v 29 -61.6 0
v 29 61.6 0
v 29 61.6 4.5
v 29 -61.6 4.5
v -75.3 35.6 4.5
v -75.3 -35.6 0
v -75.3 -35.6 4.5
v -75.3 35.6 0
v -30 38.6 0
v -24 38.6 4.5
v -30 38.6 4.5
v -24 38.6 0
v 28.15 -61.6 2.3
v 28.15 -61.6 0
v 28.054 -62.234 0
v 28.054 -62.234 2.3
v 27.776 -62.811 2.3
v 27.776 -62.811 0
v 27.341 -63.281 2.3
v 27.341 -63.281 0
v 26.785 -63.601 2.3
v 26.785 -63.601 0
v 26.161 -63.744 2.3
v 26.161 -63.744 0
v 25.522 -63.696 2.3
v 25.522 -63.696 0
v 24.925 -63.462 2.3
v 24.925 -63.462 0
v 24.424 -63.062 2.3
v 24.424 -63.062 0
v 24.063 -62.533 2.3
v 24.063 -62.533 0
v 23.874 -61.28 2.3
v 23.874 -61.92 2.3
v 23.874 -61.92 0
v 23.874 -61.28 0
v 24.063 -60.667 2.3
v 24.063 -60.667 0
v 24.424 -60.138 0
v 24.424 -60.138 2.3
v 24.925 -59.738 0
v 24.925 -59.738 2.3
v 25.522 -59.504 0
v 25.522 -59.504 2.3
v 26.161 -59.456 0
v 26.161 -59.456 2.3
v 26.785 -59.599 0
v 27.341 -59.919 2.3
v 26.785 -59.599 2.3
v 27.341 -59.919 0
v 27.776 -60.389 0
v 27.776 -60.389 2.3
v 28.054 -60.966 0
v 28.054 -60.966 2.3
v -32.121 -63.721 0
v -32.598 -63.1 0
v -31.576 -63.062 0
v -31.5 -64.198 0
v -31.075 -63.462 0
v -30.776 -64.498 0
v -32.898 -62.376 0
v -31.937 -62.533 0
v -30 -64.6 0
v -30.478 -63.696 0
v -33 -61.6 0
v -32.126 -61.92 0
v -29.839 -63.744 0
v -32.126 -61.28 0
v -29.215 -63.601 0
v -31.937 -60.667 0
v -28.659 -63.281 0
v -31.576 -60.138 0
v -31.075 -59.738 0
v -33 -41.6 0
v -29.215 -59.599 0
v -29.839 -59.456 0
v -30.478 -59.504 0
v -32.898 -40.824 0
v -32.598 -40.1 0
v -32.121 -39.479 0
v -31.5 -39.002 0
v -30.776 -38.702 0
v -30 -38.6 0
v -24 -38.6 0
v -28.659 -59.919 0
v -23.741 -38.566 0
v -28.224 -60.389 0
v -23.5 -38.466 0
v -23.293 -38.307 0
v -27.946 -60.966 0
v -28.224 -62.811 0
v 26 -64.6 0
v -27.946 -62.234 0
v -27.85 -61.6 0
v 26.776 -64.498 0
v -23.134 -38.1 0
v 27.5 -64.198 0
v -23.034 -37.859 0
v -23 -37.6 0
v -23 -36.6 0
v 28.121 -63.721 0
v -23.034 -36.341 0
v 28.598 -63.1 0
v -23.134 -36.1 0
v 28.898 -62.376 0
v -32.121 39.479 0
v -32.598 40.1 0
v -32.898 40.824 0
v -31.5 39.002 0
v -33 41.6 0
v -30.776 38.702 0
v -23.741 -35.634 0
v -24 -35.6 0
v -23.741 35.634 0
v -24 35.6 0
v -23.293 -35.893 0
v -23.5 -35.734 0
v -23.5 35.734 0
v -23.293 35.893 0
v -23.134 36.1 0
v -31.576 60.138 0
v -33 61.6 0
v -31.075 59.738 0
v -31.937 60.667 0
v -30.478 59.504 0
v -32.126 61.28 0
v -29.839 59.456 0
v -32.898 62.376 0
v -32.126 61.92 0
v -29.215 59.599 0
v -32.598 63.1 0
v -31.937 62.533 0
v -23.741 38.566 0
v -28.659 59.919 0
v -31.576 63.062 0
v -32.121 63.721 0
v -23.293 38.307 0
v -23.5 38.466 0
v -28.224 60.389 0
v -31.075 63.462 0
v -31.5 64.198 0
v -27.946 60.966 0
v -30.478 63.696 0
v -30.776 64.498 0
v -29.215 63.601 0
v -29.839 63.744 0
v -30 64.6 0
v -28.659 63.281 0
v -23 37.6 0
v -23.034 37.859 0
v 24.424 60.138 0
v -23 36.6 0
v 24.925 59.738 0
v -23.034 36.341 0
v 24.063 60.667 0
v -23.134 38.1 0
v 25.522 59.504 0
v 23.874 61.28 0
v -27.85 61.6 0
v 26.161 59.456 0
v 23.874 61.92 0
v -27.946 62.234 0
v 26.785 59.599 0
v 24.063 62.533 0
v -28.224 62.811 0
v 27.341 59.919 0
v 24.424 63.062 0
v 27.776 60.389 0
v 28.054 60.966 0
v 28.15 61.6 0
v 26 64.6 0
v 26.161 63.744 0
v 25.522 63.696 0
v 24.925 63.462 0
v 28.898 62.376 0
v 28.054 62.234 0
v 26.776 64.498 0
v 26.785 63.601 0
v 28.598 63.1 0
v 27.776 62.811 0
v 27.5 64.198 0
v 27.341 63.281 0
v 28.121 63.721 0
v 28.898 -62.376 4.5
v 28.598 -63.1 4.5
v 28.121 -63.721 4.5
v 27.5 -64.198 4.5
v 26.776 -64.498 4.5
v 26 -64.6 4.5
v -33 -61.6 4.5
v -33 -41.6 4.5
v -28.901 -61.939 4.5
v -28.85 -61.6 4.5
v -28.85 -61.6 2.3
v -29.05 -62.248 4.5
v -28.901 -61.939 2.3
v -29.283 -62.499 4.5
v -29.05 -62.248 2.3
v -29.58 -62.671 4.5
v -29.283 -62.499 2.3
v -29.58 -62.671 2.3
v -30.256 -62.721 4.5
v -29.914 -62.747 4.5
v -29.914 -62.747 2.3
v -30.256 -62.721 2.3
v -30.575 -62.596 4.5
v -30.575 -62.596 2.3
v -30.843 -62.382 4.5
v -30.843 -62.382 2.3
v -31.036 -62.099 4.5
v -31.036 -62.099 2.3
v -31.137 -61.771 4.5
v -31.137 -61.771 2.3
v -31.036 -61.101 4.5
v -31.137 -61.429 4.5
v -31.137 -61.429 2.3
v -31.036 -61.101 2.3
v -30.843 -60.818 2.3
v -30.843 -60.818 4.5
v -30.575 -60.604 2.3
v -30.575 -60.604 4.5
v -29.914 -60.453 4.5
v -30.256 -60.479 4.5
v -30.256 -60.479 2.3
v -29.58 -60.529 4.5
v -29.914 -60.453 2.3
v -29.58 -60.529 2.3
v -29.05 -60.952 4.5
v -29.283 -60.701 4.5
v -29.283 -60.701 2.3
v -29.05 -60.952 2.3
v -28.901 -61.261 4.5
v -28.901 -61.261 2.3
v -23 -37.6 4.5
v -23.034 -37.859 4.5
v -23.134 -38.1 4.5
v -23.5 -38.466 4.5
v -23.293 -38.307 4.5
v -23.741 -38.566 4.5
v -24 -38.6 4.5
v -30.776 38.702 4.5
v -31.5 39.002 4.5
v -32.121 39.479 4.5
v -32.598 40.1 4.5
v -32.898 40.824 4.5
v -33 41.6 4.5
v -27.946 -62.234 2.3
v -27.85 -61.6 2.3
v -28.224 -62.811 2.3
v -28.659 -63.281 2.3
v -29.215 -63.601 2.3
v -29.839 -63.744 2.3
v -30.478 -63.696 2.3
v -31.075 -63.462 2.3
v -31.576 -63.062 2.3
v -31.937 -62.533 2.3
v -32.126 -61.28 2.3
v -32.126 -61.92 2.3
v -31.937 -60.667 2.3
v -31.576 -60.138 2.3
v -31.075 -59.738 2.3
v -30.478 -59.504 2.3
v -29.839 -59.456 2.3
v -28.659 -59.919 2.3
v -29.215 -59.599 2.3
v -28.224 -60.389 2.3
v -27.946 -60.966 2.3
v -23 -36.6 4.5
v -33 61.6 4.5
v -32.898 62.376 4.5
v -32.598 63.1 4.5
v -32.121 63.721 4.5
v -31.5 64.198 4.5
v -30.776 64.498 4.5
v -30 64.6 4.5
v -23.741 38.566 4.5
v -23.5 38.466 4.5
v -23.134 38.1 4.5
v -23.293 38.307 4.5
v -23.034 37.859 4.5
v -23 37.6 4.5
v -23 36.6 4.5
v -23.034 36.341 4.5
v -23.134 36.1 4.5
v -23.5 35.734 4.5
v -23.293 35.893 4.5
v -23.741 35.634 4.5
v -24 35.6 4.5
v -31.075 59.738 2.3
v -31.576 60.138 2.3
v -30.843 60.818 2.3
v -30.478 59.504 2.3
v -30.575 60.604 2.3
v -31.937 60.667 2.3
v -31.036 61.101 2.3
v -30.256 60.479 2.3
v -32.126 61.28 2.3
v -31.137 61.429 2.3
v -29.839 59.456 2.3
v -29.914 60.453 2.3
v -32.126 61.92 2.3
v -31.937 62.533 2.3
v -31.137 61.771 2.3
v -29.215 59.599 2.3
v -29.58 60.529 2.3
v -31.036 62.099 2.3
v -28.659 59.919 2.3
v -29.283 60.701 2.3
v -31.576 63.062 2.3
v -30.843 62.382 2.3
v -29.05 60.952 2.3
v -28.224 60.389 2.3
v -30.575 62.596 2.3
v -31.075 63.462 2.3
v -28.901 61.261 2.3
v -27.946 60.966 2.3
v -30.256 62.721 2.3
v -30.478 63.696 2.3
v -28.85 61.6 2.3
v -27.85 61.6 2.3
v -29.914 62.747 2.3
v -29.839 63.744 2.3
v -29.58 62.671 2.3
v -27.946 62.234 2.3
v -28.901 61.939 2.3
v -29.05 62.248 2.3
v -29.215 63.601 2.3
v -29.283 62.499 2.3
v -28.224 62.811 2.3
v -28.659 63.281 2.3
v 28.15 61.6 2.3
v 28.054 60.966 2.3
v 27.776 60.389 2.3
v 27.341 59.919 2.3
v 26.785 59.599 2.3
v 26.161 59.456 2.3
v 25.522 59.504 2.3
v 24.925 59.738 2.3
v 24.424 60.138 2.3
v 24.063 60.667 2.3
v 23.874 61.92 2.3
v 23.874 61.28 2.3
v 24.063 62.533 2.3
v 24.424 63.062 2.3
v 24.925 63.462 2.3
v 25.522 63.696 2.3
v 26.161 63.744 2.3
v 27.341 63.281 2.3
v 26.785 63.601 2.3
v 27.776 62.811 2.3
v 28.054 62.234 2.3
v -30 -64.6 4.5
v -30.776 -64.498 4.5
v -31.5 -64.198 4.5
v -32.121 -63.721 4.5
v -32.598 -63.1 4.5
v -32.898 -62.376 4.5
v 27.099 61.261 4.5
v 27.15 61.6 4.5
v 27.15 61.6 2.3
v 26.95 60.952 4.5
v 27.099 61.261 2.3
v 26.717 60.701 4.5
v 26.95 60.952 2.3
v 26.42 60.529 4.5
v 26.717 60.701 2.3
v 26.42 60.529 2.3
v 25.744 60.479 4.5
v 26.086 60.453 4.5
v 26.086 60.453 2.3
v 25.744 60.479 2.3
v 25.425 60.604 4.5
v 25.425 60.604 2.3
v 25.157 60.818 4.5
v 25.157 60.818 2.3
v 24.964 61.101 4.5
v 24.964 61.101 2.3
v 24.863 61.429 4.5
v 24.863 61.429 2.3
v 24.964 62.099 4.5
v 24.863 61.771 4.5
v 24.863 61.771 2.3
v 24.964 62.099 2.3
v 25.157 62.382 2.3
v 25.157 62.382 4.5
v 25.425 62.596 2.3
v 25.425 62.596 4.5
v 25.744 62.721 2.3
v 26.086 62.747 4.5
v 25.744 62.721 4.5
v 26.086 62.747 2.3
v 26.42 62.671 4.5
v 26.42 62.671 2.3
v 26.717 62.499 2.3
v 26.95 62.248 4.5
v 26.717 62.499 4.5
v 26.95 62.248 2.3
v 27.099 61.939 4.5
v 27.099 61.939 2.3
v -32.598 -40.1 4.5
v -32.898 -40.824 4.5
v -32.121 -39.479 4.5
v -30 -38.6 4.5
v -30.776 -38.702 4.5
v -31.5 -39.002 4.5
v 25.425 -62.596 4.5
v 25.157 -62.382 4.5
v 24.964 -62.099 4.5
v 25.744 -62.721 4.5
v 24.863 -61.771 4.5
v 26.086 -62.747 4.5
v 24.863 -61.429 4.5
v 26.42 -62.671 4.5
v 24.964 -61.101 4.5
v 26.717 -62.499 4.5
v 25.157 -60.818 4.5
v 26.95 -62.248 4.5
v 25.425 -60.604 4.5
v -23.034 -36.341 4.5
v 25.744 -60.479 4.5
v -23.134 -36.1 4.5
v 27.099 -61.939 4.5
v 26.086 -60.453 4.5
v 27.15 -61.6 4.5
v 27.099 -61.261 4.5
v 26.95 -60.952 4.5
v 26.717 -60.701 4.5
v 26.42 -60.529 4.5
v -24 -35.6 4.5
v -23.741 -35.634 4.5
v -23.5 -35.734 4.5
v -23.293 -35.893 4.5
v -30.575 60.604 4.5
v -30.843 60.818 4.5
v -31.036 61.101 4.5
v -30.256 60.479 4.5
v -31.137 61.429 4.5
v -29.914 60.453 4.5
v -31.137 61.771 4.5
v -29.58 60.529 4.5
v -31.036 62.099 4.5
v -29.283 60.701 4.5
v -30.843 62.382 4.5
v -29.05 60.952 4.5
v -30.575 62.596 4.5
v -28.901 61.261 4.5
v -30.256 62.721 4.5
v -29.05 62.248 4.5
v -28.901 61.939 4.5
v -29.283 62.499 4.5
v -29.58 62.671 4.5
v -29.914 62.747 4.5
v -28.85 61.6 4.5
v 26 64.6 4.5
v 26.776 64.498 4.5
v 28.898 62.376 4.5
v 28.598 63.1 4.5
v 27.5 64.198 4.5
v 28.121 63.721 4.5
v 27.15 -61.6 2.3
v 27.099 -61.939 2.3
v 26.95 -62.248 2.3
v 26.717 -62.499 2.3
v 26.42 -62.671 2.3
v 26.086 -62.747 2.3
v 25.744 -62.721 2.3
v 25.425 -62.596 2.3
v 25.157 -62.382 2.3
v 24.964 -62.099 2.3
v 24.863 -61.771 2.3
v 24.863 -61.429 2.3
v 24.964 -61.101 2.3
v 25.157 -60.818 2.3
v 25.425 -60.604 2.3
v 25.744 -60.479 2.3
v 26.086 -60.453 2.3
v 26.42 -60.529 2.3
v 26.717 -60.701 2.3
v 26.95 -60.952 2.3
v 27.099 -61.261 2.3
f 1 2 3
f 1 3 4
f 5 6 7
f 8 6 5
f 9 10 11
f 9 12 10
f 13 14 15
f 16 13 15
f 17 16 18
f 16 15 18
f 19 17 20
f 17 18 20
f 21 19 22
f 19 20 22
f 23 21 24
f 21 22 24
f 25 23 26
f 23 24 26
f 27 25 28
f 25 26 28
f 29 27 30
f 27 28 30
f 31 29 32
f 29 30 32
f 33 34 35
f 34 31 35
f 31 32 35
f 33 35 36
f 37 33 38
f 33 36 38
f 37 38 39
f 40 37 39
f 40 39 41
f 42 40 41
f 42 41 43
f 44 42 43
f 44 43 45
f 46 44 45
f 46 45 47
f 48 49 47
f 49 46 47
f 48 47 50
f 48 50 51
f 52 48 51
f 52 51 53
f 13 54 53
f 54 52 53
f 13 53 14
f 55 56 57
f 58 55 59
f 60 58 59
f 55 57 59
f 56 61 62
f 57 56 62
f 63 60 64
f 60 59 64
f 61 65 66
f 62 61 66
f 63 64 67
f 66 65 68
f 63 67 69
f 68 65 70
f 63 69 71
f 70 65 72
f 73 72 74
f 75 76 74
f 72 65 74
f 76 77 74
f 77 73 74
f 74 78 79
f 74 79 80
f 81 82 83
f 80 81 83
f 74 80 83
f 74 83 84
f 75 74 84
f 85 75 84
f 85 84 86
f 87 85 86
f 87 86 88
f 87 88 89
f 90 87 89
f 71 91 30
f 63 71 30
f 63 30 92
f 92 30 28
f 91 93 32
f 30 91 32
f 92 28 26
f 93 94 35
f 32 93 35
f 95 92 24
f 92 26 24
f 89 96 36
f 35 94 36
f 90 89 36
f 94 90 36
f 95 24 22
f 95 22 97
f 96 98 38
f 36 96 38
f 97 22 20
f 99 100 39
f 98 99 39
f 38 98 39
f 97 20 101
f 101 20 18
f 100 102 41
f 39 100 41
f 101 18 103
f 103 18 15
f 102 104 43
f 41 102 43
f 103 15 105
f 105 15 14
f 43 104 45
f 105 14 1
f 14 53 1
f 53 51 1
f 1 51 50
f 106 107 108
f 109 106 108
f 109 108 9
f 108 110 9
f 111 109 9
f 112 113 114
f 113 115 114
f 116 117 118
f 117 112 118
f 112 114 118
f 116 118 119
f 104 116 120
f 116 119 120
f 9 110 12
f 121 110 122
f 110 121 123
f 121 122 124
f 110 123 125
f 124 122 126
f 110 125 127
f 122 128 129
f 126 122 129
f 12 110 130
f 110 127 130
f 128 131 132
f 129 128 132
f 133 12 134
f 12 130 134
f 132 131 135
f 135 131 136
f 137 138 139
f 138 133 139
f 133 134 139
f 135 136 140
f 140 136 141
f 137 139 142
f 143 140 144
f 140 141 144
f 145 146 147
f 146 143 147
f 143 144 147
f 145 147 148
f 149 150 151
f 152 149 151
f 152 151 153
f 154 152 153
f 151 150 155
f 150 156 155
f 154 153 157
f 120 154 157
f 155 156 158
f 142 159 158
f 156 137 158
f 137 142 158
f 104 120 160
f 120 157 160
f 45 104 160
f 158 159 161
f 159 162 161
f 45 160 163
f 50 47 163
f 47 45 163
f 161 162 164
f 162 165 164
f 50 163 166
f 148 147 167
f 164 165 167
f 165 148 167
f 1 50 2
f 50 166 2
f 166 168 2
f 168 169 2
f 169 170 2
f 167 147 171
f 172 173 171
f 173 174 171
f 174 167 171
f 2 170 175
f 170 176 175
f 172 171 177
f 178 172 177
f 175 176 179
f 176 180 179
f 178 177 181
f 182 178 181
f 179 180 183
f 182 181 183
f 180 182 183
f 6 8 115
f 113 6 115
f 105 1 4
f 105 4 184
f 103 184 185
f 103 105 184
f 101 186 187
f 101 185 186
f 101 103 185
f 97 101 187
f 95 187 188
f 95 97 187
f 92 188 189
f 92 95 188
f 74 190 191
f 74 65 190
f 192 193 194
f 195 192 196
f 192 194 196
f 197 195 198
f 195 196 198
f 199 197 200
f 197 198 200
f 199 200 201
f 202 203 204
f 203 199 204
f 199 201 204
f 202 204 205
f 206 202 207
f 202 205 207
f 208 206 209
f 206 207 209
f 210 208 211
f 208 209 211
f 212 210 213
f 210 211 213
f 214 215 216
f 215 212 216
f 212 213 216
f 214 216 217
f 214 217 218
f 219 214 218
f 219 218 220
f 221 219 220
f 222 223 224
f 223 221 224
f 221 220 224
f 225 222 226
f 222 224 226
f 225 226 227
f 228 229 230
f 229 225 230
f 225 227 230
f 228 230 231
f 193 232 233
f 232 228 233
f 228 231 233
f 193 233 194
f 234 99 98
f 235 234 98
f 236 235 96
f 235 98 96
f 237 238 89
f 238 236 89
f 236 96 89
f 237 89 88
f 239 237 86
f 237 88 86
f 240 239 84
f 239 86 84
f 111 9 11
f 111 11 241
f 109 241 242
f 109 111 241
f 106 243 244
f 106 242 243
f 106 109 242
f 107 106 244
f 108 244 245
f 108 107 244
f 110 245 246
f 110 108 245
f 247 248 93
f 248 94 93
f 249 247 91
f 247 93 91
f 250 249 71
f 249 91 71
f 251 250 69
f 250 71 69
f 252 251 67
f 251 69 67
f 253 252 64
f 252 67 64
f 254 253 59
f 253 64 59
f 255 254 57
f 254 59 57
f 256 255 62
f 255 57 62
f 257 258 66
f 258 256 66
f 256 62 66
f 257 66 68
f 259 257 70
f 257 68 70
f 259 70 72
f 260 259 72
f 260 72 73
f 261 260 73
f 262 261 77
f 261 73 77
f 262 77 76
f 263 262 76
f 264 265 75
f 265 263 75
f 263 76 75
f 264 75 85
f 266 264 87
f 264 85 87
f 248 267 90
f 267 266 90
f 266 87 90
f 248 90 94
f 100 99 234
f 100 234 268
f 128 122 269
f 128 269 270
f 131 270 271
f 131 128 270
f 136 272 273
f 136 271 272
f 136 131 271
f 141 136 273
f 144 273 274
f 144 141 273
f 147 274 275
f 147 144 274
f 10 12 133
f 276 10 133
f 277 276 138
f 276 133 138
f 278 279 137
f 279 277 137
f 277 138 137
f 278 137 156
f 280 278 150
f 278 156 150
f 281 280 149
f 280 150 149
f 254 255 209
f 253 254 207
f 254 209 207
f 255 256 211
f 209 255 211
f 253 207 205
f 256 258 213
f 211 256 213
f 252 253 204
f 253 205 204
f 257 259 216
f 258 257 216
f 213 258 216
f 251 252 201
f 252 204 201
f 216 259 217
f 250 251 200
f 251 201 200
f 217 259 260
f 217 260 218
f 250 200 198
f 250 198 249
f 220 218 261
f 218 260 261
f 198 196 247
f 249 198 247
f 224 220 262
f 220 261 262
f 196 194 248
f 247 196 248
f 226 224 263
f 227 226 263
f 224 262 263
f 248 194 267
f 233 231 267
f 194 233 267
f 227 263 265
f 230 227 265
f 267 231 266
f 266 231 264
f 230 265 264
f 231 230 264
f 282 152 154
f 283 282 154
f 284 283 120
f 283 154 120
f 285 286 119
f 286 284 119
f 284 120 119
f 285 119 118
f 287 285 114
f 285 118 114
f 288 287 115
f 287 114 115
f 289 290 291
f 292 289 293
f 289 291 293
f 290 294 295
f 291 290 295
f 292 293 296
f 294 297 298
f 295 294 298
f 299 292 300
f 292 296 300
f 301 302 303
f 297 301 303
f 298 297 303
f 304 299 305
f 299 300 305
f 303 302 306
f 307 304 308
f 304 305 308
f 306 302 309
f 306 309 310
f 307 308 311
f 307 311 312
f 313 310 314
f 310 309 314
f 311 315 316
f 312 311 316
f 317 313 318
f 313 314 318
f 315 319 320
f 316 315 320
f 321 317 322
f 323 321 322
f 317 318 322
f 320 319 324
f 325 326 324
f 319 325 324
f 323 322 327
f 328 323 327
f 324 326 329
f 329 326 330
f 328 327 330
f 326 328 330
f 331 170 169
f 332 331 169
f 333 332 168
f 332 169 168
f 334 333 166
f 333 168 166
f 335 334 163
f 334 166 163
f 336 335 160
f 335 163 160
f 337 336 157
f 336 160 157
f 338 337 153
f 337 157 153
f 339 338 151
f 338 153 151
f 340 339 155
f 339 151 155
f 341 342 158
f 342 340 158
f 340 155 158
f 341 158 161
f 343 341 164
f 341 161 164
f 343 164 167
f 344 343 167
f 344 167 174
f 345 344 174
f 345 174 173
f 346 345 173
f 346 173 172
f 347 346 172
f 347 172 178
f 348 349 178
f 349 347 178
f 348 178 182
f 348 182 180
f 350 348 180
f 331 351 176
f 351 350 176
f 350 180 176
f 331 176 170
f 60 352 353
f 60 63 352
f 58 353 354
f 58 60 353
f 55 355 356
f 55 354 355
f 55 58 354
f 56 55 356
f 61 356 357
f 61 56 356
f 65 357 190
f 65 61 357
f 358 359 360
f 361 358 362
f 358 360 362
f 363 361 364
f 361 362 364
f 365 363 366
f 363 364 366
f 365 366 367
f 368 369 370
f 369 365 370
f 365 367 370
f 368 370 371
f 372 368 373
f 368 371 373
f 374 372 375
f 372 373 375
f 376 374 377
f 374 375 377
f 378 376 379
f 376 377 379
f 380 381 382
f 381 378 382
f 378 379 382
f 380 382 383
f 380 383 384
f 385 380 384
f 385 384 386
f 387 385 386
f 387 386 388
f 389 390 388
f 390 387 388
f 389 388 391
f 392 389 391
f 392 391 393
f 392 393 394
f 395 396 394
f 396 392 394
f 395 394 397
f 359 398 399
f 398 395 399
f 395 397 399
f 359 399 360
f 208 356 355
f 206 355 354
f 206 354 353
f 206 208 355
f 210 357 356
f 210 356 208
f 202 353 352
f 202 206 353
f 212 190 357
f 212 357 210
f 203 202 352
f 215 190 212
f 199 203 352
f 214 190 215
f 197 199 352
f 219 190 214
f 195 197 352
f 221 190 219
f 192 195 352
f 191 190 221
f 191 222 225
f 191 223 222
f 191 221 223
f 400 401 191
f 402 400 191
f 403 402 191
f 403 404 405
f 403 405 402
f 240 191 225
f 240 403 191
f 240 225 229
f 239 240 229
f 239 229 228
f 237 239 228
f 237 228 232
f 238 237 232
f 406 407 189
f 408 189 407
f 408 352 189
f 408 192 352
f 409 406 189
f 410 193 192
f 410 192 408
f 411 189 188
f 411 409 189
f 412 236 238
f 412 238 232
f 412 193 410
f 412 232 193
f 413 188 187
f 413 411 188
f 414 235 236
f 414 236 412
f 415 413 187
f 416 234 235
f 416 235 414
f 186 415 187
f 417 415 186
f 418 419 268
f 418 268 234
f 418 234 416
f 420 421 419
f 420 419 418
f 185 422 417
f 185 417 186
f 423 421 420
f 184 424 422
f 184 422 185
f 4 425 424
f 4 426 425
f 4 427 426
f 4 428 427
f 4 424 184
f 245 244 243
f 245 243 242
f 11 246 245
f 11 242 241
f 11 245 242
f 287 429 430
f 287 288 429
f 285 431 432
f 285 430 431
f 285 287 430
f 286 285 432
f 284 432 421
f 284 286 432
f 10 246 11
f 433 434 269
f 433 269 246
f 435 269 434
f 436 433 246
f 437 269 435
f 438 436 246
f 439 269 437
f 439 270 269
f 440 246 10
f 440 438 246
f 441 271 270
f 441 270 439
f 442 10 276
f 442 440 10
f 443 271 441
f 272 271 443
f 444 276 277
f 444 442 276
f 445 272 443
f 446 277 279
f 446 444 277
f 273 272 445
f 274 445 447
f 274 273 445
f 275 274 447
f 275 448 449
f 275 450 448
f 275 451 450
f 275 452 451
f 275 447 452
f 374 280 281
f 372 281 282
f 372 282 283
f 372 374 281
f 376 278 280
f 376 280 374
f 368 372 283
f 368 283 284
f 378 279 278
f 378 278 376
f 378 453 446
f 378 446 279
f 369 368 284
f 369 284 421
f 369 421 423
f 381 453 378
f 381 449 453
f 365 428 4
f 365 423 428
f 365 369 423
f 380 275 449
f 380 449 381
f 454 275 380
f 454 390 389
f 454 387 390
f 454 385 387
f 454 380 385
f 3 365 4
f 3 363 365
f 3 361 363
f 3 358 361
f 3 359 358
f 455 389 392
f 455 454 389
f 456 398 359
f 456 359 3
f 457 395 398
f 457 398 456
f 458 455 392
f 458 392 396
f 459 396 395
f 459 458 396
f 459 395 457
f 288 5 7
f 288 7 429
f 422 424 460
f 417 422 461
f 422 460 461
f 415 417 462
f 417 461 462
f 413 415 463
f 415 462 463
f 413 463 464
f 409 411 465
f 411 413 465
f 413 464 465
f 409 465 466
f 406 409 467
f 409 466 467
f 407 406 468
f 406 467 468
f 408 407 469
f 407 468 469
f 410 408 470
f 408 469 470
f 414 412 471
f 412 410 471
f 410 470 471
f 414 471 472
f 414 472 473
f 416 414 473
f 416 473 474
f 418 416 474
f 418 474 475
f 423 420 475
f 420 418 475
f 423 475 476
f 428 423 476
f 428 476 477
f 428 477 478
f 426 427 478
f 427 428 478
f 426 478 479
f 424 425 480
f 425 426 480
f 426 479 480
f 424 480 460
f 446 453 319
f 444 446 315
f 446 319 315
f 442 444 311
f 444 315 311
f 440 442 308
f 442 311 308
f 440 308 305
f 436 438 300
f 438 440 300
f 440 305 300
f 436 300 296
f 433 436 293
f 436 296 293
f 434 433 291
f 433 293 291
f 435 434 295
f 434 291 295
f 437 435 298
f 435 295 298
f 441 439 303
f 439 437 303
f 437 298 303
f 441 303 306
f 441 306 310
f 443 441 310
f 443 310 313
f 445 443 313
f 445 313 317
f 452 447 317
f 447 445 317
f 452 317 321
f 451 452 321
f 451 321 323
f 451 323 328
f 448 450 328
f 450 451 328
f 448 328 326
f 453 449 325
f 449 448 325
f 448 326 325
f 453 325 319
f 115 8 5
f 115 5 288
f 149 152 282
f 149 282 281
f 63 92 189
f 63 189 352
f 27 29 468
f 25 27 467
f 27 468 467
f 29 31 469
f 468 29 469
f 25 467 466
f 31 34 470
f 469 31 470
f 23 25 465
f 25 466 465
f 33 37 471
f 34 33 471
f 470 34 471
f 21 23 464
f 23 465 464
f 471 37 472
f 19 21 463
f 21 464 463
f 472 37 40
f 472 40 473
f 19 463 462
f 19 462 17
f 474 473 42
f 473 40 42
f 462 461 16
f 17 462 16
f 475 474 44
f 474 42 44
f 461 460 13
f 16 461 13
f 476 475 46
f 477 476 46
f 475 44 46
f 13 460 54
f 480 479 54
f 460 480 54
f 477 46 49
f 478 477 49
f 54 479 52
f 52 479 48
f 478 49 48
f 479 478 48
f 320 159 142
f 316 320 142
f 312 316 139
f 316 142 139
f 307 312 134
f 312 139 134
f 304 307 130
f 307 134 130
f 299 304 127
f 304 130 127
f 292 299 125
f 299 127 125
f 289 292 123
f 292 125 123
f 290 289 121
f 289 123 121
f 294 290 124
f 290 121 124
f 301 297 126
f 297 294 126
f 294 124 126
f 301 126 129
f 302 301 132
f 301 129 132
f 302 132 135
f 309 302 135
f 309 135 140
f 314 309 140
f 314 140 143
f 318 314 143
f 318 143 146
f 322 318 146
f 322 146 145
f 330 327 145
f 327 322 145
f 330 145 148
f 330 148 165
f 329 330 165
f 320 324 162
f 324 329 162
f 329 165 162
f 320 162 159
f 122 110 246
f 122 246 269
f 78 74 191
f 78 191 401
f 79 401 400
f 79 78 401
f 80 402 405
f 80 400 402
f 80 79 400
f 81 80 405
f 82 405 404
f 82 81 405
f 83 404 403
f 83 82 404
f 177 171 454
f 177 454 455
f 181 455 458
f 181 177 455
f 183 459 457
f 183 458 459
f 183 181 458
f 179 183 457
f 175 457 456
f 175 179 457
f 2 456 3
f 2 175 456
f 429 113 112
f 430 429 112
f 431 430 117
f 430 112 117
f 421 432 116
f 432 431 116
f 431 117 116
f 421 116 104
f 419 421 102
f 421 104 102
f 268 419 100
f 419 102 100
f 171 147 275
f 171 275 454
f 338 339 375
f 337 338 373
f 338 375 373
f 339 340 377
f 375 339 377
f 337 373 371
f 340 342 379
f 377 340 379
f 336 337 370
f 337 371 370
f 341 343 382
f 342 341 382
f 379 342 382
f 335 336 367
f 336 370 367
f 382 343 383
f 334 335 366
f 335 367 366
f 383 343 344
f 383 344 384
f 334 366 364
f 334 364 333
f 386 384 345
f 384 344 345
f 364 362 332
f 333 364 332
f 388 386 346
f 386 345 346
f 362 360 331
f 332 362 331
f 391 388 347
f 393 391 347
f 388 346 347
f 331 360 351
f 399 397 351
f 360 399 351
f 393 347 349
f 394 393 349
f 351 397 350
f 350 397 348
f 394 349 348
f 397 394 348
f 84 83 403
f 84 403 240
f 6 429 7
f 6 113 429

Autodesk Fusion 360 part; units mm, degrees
sketch "Exact underside rim - R3 desk, R1 shoulders, square chair" plane through (0, 0, 0) normal (0, 0, 1) x (1, 0, 0)
  line L0 (-75.3, 35.6) -> (-24, 35.6)
  arc A0 (-24, 35.6) -> (-23, 36.6) centre (-24, 36.6) ccw
  line L1 (-23, 36.6) -> (-23, 37.6)
  arc A1 (-23, 37.6) -> (-24, 38.6) centre (-24, 37.6) ccw
  line L2 (-24, 38.6) -> (-30, 38.6)
  arc A2 (-33, 41.6) -> (-30, 38.6) centre (-30, 41.6) ccw
  line L3 (-33, 41.6) -> (-33, 61.6)
  arc A3 (-30, 64.6) -> (-33, 61.6) centre (-30, 61.6) ccw
  line L4 (-30, 64.6) -> (26, 64.6)
  arc A4 (29, 61.6) -> (26, 64.6) centre (26, 61.6) ccw
  line L5 (29, 61.6) -> (29, -61.6)
  arc A5 (26, -64.6) -> (29, -61.6) centre (26, -61.6) ccw
  line L6 (26, -64.6) -> (-30, -64.6)
  arc A6 (-33, -61.6) -> (-30, -64.6) centre (-30, -61.6) ccw
  line L7 (-33, -61.6) -> (-33, -41.6)
  arc A7 (-30, -38.6) -> (-33, -41.6) centre (-30, -41.6) ccw
  line L8 (-30, -38.6) -> (-24, -38.6)
  arc A8 (-24, -38.6) -> (-23, -37.6) centre (-24, -37.6) ccw
  line L9 (-23, -37.6) -> (-23, -36.6)
  arc A9 (-23, -36.6) -> (-24, -35.6) centre (-24, -36.6) ccw
  line L10 (-24, -35.6) -> (-75.3, -35.6)
  line L11 (-75.3, -35.6) -> (-75.3, 35.6)
extrude "Plate - exact flush rim and flat floor" add sketch "Exact underside rim - R3 desk, R1 shoulders, square chair" along normal blind 4.5
sketch "M2 through holes" plane through (0, 0, 0) normal (0, 0, 1) x (1, 0, 0)
  circle A0 centre (-30, -61.6) radius 1.15
  circle A1 centre (26, -61.6) radius 1.15
  circle A2 centre (-30, 61.6) radius 1.15
  circle A3 centre (26, 61.6) radius 1.15
  dimension "d8" = 2.3
  dimension "d9" = 2.3
  dimension "d10" = 2.3
  dimension "d11" = 2.3
extrude "M2 through holes (1)" cut sketch "M2 through holes" along normal blind 4.5
sketch "Recessed M2 heads on floor side" plane through (0, 0, 0) normal (0, 0, 1) x (1, 0, 0)
  circle A0 centre (-30, -61.6) radius 2.15
  circle A1 centre (26, -61.6) radius 2.15
  circle A2 centre (-30, 61.6) radius 2.15
  circle A3 centre (26, 61.6) radius 2.15
  dimension "d14" = 4.3
  dimension "d15" = 4.3
  dimension "d16" = 4.3
  dimension "d17" = 4.3
extrude "Recessed M2 heads on floor side (1)" cut sketch "Recessed M2 heads on floor side" along normal blind 2.3
equation "plate_thickness = 4.5 mm" comment "Overall plate thickness"
equation "clearance = 0.3 mm" comment "Original robot CAD clearance"
equation "screw_diameter = 2 mm" comment "M2 nominal shaft diameter"
equation "screw_head_diameter = 4 mm" comment "Original CAD head envelope"
equation "screw_head_height = 2 mm" comment "Original CAD head height envelope"
equation "d6 = plate_thickness"
equation "d8 = screw_diameter + clearance"
equation "d9 = screw_diameter + clearance"
equation "d10 = screw_diameter + clearance"
equation "d11 = screw_diameter + clearance"
equation "d12 = plate_thickness"
equation "d14 = screw_head_diameter + clearance"
equation "d15 = screw_head_diameter + clearance"
equation "d16 = screw_head_diameter + clearance"
equation "d17 = screw_head_diameter + clearance"
equation "d18 = screw_head_height + clearance"
